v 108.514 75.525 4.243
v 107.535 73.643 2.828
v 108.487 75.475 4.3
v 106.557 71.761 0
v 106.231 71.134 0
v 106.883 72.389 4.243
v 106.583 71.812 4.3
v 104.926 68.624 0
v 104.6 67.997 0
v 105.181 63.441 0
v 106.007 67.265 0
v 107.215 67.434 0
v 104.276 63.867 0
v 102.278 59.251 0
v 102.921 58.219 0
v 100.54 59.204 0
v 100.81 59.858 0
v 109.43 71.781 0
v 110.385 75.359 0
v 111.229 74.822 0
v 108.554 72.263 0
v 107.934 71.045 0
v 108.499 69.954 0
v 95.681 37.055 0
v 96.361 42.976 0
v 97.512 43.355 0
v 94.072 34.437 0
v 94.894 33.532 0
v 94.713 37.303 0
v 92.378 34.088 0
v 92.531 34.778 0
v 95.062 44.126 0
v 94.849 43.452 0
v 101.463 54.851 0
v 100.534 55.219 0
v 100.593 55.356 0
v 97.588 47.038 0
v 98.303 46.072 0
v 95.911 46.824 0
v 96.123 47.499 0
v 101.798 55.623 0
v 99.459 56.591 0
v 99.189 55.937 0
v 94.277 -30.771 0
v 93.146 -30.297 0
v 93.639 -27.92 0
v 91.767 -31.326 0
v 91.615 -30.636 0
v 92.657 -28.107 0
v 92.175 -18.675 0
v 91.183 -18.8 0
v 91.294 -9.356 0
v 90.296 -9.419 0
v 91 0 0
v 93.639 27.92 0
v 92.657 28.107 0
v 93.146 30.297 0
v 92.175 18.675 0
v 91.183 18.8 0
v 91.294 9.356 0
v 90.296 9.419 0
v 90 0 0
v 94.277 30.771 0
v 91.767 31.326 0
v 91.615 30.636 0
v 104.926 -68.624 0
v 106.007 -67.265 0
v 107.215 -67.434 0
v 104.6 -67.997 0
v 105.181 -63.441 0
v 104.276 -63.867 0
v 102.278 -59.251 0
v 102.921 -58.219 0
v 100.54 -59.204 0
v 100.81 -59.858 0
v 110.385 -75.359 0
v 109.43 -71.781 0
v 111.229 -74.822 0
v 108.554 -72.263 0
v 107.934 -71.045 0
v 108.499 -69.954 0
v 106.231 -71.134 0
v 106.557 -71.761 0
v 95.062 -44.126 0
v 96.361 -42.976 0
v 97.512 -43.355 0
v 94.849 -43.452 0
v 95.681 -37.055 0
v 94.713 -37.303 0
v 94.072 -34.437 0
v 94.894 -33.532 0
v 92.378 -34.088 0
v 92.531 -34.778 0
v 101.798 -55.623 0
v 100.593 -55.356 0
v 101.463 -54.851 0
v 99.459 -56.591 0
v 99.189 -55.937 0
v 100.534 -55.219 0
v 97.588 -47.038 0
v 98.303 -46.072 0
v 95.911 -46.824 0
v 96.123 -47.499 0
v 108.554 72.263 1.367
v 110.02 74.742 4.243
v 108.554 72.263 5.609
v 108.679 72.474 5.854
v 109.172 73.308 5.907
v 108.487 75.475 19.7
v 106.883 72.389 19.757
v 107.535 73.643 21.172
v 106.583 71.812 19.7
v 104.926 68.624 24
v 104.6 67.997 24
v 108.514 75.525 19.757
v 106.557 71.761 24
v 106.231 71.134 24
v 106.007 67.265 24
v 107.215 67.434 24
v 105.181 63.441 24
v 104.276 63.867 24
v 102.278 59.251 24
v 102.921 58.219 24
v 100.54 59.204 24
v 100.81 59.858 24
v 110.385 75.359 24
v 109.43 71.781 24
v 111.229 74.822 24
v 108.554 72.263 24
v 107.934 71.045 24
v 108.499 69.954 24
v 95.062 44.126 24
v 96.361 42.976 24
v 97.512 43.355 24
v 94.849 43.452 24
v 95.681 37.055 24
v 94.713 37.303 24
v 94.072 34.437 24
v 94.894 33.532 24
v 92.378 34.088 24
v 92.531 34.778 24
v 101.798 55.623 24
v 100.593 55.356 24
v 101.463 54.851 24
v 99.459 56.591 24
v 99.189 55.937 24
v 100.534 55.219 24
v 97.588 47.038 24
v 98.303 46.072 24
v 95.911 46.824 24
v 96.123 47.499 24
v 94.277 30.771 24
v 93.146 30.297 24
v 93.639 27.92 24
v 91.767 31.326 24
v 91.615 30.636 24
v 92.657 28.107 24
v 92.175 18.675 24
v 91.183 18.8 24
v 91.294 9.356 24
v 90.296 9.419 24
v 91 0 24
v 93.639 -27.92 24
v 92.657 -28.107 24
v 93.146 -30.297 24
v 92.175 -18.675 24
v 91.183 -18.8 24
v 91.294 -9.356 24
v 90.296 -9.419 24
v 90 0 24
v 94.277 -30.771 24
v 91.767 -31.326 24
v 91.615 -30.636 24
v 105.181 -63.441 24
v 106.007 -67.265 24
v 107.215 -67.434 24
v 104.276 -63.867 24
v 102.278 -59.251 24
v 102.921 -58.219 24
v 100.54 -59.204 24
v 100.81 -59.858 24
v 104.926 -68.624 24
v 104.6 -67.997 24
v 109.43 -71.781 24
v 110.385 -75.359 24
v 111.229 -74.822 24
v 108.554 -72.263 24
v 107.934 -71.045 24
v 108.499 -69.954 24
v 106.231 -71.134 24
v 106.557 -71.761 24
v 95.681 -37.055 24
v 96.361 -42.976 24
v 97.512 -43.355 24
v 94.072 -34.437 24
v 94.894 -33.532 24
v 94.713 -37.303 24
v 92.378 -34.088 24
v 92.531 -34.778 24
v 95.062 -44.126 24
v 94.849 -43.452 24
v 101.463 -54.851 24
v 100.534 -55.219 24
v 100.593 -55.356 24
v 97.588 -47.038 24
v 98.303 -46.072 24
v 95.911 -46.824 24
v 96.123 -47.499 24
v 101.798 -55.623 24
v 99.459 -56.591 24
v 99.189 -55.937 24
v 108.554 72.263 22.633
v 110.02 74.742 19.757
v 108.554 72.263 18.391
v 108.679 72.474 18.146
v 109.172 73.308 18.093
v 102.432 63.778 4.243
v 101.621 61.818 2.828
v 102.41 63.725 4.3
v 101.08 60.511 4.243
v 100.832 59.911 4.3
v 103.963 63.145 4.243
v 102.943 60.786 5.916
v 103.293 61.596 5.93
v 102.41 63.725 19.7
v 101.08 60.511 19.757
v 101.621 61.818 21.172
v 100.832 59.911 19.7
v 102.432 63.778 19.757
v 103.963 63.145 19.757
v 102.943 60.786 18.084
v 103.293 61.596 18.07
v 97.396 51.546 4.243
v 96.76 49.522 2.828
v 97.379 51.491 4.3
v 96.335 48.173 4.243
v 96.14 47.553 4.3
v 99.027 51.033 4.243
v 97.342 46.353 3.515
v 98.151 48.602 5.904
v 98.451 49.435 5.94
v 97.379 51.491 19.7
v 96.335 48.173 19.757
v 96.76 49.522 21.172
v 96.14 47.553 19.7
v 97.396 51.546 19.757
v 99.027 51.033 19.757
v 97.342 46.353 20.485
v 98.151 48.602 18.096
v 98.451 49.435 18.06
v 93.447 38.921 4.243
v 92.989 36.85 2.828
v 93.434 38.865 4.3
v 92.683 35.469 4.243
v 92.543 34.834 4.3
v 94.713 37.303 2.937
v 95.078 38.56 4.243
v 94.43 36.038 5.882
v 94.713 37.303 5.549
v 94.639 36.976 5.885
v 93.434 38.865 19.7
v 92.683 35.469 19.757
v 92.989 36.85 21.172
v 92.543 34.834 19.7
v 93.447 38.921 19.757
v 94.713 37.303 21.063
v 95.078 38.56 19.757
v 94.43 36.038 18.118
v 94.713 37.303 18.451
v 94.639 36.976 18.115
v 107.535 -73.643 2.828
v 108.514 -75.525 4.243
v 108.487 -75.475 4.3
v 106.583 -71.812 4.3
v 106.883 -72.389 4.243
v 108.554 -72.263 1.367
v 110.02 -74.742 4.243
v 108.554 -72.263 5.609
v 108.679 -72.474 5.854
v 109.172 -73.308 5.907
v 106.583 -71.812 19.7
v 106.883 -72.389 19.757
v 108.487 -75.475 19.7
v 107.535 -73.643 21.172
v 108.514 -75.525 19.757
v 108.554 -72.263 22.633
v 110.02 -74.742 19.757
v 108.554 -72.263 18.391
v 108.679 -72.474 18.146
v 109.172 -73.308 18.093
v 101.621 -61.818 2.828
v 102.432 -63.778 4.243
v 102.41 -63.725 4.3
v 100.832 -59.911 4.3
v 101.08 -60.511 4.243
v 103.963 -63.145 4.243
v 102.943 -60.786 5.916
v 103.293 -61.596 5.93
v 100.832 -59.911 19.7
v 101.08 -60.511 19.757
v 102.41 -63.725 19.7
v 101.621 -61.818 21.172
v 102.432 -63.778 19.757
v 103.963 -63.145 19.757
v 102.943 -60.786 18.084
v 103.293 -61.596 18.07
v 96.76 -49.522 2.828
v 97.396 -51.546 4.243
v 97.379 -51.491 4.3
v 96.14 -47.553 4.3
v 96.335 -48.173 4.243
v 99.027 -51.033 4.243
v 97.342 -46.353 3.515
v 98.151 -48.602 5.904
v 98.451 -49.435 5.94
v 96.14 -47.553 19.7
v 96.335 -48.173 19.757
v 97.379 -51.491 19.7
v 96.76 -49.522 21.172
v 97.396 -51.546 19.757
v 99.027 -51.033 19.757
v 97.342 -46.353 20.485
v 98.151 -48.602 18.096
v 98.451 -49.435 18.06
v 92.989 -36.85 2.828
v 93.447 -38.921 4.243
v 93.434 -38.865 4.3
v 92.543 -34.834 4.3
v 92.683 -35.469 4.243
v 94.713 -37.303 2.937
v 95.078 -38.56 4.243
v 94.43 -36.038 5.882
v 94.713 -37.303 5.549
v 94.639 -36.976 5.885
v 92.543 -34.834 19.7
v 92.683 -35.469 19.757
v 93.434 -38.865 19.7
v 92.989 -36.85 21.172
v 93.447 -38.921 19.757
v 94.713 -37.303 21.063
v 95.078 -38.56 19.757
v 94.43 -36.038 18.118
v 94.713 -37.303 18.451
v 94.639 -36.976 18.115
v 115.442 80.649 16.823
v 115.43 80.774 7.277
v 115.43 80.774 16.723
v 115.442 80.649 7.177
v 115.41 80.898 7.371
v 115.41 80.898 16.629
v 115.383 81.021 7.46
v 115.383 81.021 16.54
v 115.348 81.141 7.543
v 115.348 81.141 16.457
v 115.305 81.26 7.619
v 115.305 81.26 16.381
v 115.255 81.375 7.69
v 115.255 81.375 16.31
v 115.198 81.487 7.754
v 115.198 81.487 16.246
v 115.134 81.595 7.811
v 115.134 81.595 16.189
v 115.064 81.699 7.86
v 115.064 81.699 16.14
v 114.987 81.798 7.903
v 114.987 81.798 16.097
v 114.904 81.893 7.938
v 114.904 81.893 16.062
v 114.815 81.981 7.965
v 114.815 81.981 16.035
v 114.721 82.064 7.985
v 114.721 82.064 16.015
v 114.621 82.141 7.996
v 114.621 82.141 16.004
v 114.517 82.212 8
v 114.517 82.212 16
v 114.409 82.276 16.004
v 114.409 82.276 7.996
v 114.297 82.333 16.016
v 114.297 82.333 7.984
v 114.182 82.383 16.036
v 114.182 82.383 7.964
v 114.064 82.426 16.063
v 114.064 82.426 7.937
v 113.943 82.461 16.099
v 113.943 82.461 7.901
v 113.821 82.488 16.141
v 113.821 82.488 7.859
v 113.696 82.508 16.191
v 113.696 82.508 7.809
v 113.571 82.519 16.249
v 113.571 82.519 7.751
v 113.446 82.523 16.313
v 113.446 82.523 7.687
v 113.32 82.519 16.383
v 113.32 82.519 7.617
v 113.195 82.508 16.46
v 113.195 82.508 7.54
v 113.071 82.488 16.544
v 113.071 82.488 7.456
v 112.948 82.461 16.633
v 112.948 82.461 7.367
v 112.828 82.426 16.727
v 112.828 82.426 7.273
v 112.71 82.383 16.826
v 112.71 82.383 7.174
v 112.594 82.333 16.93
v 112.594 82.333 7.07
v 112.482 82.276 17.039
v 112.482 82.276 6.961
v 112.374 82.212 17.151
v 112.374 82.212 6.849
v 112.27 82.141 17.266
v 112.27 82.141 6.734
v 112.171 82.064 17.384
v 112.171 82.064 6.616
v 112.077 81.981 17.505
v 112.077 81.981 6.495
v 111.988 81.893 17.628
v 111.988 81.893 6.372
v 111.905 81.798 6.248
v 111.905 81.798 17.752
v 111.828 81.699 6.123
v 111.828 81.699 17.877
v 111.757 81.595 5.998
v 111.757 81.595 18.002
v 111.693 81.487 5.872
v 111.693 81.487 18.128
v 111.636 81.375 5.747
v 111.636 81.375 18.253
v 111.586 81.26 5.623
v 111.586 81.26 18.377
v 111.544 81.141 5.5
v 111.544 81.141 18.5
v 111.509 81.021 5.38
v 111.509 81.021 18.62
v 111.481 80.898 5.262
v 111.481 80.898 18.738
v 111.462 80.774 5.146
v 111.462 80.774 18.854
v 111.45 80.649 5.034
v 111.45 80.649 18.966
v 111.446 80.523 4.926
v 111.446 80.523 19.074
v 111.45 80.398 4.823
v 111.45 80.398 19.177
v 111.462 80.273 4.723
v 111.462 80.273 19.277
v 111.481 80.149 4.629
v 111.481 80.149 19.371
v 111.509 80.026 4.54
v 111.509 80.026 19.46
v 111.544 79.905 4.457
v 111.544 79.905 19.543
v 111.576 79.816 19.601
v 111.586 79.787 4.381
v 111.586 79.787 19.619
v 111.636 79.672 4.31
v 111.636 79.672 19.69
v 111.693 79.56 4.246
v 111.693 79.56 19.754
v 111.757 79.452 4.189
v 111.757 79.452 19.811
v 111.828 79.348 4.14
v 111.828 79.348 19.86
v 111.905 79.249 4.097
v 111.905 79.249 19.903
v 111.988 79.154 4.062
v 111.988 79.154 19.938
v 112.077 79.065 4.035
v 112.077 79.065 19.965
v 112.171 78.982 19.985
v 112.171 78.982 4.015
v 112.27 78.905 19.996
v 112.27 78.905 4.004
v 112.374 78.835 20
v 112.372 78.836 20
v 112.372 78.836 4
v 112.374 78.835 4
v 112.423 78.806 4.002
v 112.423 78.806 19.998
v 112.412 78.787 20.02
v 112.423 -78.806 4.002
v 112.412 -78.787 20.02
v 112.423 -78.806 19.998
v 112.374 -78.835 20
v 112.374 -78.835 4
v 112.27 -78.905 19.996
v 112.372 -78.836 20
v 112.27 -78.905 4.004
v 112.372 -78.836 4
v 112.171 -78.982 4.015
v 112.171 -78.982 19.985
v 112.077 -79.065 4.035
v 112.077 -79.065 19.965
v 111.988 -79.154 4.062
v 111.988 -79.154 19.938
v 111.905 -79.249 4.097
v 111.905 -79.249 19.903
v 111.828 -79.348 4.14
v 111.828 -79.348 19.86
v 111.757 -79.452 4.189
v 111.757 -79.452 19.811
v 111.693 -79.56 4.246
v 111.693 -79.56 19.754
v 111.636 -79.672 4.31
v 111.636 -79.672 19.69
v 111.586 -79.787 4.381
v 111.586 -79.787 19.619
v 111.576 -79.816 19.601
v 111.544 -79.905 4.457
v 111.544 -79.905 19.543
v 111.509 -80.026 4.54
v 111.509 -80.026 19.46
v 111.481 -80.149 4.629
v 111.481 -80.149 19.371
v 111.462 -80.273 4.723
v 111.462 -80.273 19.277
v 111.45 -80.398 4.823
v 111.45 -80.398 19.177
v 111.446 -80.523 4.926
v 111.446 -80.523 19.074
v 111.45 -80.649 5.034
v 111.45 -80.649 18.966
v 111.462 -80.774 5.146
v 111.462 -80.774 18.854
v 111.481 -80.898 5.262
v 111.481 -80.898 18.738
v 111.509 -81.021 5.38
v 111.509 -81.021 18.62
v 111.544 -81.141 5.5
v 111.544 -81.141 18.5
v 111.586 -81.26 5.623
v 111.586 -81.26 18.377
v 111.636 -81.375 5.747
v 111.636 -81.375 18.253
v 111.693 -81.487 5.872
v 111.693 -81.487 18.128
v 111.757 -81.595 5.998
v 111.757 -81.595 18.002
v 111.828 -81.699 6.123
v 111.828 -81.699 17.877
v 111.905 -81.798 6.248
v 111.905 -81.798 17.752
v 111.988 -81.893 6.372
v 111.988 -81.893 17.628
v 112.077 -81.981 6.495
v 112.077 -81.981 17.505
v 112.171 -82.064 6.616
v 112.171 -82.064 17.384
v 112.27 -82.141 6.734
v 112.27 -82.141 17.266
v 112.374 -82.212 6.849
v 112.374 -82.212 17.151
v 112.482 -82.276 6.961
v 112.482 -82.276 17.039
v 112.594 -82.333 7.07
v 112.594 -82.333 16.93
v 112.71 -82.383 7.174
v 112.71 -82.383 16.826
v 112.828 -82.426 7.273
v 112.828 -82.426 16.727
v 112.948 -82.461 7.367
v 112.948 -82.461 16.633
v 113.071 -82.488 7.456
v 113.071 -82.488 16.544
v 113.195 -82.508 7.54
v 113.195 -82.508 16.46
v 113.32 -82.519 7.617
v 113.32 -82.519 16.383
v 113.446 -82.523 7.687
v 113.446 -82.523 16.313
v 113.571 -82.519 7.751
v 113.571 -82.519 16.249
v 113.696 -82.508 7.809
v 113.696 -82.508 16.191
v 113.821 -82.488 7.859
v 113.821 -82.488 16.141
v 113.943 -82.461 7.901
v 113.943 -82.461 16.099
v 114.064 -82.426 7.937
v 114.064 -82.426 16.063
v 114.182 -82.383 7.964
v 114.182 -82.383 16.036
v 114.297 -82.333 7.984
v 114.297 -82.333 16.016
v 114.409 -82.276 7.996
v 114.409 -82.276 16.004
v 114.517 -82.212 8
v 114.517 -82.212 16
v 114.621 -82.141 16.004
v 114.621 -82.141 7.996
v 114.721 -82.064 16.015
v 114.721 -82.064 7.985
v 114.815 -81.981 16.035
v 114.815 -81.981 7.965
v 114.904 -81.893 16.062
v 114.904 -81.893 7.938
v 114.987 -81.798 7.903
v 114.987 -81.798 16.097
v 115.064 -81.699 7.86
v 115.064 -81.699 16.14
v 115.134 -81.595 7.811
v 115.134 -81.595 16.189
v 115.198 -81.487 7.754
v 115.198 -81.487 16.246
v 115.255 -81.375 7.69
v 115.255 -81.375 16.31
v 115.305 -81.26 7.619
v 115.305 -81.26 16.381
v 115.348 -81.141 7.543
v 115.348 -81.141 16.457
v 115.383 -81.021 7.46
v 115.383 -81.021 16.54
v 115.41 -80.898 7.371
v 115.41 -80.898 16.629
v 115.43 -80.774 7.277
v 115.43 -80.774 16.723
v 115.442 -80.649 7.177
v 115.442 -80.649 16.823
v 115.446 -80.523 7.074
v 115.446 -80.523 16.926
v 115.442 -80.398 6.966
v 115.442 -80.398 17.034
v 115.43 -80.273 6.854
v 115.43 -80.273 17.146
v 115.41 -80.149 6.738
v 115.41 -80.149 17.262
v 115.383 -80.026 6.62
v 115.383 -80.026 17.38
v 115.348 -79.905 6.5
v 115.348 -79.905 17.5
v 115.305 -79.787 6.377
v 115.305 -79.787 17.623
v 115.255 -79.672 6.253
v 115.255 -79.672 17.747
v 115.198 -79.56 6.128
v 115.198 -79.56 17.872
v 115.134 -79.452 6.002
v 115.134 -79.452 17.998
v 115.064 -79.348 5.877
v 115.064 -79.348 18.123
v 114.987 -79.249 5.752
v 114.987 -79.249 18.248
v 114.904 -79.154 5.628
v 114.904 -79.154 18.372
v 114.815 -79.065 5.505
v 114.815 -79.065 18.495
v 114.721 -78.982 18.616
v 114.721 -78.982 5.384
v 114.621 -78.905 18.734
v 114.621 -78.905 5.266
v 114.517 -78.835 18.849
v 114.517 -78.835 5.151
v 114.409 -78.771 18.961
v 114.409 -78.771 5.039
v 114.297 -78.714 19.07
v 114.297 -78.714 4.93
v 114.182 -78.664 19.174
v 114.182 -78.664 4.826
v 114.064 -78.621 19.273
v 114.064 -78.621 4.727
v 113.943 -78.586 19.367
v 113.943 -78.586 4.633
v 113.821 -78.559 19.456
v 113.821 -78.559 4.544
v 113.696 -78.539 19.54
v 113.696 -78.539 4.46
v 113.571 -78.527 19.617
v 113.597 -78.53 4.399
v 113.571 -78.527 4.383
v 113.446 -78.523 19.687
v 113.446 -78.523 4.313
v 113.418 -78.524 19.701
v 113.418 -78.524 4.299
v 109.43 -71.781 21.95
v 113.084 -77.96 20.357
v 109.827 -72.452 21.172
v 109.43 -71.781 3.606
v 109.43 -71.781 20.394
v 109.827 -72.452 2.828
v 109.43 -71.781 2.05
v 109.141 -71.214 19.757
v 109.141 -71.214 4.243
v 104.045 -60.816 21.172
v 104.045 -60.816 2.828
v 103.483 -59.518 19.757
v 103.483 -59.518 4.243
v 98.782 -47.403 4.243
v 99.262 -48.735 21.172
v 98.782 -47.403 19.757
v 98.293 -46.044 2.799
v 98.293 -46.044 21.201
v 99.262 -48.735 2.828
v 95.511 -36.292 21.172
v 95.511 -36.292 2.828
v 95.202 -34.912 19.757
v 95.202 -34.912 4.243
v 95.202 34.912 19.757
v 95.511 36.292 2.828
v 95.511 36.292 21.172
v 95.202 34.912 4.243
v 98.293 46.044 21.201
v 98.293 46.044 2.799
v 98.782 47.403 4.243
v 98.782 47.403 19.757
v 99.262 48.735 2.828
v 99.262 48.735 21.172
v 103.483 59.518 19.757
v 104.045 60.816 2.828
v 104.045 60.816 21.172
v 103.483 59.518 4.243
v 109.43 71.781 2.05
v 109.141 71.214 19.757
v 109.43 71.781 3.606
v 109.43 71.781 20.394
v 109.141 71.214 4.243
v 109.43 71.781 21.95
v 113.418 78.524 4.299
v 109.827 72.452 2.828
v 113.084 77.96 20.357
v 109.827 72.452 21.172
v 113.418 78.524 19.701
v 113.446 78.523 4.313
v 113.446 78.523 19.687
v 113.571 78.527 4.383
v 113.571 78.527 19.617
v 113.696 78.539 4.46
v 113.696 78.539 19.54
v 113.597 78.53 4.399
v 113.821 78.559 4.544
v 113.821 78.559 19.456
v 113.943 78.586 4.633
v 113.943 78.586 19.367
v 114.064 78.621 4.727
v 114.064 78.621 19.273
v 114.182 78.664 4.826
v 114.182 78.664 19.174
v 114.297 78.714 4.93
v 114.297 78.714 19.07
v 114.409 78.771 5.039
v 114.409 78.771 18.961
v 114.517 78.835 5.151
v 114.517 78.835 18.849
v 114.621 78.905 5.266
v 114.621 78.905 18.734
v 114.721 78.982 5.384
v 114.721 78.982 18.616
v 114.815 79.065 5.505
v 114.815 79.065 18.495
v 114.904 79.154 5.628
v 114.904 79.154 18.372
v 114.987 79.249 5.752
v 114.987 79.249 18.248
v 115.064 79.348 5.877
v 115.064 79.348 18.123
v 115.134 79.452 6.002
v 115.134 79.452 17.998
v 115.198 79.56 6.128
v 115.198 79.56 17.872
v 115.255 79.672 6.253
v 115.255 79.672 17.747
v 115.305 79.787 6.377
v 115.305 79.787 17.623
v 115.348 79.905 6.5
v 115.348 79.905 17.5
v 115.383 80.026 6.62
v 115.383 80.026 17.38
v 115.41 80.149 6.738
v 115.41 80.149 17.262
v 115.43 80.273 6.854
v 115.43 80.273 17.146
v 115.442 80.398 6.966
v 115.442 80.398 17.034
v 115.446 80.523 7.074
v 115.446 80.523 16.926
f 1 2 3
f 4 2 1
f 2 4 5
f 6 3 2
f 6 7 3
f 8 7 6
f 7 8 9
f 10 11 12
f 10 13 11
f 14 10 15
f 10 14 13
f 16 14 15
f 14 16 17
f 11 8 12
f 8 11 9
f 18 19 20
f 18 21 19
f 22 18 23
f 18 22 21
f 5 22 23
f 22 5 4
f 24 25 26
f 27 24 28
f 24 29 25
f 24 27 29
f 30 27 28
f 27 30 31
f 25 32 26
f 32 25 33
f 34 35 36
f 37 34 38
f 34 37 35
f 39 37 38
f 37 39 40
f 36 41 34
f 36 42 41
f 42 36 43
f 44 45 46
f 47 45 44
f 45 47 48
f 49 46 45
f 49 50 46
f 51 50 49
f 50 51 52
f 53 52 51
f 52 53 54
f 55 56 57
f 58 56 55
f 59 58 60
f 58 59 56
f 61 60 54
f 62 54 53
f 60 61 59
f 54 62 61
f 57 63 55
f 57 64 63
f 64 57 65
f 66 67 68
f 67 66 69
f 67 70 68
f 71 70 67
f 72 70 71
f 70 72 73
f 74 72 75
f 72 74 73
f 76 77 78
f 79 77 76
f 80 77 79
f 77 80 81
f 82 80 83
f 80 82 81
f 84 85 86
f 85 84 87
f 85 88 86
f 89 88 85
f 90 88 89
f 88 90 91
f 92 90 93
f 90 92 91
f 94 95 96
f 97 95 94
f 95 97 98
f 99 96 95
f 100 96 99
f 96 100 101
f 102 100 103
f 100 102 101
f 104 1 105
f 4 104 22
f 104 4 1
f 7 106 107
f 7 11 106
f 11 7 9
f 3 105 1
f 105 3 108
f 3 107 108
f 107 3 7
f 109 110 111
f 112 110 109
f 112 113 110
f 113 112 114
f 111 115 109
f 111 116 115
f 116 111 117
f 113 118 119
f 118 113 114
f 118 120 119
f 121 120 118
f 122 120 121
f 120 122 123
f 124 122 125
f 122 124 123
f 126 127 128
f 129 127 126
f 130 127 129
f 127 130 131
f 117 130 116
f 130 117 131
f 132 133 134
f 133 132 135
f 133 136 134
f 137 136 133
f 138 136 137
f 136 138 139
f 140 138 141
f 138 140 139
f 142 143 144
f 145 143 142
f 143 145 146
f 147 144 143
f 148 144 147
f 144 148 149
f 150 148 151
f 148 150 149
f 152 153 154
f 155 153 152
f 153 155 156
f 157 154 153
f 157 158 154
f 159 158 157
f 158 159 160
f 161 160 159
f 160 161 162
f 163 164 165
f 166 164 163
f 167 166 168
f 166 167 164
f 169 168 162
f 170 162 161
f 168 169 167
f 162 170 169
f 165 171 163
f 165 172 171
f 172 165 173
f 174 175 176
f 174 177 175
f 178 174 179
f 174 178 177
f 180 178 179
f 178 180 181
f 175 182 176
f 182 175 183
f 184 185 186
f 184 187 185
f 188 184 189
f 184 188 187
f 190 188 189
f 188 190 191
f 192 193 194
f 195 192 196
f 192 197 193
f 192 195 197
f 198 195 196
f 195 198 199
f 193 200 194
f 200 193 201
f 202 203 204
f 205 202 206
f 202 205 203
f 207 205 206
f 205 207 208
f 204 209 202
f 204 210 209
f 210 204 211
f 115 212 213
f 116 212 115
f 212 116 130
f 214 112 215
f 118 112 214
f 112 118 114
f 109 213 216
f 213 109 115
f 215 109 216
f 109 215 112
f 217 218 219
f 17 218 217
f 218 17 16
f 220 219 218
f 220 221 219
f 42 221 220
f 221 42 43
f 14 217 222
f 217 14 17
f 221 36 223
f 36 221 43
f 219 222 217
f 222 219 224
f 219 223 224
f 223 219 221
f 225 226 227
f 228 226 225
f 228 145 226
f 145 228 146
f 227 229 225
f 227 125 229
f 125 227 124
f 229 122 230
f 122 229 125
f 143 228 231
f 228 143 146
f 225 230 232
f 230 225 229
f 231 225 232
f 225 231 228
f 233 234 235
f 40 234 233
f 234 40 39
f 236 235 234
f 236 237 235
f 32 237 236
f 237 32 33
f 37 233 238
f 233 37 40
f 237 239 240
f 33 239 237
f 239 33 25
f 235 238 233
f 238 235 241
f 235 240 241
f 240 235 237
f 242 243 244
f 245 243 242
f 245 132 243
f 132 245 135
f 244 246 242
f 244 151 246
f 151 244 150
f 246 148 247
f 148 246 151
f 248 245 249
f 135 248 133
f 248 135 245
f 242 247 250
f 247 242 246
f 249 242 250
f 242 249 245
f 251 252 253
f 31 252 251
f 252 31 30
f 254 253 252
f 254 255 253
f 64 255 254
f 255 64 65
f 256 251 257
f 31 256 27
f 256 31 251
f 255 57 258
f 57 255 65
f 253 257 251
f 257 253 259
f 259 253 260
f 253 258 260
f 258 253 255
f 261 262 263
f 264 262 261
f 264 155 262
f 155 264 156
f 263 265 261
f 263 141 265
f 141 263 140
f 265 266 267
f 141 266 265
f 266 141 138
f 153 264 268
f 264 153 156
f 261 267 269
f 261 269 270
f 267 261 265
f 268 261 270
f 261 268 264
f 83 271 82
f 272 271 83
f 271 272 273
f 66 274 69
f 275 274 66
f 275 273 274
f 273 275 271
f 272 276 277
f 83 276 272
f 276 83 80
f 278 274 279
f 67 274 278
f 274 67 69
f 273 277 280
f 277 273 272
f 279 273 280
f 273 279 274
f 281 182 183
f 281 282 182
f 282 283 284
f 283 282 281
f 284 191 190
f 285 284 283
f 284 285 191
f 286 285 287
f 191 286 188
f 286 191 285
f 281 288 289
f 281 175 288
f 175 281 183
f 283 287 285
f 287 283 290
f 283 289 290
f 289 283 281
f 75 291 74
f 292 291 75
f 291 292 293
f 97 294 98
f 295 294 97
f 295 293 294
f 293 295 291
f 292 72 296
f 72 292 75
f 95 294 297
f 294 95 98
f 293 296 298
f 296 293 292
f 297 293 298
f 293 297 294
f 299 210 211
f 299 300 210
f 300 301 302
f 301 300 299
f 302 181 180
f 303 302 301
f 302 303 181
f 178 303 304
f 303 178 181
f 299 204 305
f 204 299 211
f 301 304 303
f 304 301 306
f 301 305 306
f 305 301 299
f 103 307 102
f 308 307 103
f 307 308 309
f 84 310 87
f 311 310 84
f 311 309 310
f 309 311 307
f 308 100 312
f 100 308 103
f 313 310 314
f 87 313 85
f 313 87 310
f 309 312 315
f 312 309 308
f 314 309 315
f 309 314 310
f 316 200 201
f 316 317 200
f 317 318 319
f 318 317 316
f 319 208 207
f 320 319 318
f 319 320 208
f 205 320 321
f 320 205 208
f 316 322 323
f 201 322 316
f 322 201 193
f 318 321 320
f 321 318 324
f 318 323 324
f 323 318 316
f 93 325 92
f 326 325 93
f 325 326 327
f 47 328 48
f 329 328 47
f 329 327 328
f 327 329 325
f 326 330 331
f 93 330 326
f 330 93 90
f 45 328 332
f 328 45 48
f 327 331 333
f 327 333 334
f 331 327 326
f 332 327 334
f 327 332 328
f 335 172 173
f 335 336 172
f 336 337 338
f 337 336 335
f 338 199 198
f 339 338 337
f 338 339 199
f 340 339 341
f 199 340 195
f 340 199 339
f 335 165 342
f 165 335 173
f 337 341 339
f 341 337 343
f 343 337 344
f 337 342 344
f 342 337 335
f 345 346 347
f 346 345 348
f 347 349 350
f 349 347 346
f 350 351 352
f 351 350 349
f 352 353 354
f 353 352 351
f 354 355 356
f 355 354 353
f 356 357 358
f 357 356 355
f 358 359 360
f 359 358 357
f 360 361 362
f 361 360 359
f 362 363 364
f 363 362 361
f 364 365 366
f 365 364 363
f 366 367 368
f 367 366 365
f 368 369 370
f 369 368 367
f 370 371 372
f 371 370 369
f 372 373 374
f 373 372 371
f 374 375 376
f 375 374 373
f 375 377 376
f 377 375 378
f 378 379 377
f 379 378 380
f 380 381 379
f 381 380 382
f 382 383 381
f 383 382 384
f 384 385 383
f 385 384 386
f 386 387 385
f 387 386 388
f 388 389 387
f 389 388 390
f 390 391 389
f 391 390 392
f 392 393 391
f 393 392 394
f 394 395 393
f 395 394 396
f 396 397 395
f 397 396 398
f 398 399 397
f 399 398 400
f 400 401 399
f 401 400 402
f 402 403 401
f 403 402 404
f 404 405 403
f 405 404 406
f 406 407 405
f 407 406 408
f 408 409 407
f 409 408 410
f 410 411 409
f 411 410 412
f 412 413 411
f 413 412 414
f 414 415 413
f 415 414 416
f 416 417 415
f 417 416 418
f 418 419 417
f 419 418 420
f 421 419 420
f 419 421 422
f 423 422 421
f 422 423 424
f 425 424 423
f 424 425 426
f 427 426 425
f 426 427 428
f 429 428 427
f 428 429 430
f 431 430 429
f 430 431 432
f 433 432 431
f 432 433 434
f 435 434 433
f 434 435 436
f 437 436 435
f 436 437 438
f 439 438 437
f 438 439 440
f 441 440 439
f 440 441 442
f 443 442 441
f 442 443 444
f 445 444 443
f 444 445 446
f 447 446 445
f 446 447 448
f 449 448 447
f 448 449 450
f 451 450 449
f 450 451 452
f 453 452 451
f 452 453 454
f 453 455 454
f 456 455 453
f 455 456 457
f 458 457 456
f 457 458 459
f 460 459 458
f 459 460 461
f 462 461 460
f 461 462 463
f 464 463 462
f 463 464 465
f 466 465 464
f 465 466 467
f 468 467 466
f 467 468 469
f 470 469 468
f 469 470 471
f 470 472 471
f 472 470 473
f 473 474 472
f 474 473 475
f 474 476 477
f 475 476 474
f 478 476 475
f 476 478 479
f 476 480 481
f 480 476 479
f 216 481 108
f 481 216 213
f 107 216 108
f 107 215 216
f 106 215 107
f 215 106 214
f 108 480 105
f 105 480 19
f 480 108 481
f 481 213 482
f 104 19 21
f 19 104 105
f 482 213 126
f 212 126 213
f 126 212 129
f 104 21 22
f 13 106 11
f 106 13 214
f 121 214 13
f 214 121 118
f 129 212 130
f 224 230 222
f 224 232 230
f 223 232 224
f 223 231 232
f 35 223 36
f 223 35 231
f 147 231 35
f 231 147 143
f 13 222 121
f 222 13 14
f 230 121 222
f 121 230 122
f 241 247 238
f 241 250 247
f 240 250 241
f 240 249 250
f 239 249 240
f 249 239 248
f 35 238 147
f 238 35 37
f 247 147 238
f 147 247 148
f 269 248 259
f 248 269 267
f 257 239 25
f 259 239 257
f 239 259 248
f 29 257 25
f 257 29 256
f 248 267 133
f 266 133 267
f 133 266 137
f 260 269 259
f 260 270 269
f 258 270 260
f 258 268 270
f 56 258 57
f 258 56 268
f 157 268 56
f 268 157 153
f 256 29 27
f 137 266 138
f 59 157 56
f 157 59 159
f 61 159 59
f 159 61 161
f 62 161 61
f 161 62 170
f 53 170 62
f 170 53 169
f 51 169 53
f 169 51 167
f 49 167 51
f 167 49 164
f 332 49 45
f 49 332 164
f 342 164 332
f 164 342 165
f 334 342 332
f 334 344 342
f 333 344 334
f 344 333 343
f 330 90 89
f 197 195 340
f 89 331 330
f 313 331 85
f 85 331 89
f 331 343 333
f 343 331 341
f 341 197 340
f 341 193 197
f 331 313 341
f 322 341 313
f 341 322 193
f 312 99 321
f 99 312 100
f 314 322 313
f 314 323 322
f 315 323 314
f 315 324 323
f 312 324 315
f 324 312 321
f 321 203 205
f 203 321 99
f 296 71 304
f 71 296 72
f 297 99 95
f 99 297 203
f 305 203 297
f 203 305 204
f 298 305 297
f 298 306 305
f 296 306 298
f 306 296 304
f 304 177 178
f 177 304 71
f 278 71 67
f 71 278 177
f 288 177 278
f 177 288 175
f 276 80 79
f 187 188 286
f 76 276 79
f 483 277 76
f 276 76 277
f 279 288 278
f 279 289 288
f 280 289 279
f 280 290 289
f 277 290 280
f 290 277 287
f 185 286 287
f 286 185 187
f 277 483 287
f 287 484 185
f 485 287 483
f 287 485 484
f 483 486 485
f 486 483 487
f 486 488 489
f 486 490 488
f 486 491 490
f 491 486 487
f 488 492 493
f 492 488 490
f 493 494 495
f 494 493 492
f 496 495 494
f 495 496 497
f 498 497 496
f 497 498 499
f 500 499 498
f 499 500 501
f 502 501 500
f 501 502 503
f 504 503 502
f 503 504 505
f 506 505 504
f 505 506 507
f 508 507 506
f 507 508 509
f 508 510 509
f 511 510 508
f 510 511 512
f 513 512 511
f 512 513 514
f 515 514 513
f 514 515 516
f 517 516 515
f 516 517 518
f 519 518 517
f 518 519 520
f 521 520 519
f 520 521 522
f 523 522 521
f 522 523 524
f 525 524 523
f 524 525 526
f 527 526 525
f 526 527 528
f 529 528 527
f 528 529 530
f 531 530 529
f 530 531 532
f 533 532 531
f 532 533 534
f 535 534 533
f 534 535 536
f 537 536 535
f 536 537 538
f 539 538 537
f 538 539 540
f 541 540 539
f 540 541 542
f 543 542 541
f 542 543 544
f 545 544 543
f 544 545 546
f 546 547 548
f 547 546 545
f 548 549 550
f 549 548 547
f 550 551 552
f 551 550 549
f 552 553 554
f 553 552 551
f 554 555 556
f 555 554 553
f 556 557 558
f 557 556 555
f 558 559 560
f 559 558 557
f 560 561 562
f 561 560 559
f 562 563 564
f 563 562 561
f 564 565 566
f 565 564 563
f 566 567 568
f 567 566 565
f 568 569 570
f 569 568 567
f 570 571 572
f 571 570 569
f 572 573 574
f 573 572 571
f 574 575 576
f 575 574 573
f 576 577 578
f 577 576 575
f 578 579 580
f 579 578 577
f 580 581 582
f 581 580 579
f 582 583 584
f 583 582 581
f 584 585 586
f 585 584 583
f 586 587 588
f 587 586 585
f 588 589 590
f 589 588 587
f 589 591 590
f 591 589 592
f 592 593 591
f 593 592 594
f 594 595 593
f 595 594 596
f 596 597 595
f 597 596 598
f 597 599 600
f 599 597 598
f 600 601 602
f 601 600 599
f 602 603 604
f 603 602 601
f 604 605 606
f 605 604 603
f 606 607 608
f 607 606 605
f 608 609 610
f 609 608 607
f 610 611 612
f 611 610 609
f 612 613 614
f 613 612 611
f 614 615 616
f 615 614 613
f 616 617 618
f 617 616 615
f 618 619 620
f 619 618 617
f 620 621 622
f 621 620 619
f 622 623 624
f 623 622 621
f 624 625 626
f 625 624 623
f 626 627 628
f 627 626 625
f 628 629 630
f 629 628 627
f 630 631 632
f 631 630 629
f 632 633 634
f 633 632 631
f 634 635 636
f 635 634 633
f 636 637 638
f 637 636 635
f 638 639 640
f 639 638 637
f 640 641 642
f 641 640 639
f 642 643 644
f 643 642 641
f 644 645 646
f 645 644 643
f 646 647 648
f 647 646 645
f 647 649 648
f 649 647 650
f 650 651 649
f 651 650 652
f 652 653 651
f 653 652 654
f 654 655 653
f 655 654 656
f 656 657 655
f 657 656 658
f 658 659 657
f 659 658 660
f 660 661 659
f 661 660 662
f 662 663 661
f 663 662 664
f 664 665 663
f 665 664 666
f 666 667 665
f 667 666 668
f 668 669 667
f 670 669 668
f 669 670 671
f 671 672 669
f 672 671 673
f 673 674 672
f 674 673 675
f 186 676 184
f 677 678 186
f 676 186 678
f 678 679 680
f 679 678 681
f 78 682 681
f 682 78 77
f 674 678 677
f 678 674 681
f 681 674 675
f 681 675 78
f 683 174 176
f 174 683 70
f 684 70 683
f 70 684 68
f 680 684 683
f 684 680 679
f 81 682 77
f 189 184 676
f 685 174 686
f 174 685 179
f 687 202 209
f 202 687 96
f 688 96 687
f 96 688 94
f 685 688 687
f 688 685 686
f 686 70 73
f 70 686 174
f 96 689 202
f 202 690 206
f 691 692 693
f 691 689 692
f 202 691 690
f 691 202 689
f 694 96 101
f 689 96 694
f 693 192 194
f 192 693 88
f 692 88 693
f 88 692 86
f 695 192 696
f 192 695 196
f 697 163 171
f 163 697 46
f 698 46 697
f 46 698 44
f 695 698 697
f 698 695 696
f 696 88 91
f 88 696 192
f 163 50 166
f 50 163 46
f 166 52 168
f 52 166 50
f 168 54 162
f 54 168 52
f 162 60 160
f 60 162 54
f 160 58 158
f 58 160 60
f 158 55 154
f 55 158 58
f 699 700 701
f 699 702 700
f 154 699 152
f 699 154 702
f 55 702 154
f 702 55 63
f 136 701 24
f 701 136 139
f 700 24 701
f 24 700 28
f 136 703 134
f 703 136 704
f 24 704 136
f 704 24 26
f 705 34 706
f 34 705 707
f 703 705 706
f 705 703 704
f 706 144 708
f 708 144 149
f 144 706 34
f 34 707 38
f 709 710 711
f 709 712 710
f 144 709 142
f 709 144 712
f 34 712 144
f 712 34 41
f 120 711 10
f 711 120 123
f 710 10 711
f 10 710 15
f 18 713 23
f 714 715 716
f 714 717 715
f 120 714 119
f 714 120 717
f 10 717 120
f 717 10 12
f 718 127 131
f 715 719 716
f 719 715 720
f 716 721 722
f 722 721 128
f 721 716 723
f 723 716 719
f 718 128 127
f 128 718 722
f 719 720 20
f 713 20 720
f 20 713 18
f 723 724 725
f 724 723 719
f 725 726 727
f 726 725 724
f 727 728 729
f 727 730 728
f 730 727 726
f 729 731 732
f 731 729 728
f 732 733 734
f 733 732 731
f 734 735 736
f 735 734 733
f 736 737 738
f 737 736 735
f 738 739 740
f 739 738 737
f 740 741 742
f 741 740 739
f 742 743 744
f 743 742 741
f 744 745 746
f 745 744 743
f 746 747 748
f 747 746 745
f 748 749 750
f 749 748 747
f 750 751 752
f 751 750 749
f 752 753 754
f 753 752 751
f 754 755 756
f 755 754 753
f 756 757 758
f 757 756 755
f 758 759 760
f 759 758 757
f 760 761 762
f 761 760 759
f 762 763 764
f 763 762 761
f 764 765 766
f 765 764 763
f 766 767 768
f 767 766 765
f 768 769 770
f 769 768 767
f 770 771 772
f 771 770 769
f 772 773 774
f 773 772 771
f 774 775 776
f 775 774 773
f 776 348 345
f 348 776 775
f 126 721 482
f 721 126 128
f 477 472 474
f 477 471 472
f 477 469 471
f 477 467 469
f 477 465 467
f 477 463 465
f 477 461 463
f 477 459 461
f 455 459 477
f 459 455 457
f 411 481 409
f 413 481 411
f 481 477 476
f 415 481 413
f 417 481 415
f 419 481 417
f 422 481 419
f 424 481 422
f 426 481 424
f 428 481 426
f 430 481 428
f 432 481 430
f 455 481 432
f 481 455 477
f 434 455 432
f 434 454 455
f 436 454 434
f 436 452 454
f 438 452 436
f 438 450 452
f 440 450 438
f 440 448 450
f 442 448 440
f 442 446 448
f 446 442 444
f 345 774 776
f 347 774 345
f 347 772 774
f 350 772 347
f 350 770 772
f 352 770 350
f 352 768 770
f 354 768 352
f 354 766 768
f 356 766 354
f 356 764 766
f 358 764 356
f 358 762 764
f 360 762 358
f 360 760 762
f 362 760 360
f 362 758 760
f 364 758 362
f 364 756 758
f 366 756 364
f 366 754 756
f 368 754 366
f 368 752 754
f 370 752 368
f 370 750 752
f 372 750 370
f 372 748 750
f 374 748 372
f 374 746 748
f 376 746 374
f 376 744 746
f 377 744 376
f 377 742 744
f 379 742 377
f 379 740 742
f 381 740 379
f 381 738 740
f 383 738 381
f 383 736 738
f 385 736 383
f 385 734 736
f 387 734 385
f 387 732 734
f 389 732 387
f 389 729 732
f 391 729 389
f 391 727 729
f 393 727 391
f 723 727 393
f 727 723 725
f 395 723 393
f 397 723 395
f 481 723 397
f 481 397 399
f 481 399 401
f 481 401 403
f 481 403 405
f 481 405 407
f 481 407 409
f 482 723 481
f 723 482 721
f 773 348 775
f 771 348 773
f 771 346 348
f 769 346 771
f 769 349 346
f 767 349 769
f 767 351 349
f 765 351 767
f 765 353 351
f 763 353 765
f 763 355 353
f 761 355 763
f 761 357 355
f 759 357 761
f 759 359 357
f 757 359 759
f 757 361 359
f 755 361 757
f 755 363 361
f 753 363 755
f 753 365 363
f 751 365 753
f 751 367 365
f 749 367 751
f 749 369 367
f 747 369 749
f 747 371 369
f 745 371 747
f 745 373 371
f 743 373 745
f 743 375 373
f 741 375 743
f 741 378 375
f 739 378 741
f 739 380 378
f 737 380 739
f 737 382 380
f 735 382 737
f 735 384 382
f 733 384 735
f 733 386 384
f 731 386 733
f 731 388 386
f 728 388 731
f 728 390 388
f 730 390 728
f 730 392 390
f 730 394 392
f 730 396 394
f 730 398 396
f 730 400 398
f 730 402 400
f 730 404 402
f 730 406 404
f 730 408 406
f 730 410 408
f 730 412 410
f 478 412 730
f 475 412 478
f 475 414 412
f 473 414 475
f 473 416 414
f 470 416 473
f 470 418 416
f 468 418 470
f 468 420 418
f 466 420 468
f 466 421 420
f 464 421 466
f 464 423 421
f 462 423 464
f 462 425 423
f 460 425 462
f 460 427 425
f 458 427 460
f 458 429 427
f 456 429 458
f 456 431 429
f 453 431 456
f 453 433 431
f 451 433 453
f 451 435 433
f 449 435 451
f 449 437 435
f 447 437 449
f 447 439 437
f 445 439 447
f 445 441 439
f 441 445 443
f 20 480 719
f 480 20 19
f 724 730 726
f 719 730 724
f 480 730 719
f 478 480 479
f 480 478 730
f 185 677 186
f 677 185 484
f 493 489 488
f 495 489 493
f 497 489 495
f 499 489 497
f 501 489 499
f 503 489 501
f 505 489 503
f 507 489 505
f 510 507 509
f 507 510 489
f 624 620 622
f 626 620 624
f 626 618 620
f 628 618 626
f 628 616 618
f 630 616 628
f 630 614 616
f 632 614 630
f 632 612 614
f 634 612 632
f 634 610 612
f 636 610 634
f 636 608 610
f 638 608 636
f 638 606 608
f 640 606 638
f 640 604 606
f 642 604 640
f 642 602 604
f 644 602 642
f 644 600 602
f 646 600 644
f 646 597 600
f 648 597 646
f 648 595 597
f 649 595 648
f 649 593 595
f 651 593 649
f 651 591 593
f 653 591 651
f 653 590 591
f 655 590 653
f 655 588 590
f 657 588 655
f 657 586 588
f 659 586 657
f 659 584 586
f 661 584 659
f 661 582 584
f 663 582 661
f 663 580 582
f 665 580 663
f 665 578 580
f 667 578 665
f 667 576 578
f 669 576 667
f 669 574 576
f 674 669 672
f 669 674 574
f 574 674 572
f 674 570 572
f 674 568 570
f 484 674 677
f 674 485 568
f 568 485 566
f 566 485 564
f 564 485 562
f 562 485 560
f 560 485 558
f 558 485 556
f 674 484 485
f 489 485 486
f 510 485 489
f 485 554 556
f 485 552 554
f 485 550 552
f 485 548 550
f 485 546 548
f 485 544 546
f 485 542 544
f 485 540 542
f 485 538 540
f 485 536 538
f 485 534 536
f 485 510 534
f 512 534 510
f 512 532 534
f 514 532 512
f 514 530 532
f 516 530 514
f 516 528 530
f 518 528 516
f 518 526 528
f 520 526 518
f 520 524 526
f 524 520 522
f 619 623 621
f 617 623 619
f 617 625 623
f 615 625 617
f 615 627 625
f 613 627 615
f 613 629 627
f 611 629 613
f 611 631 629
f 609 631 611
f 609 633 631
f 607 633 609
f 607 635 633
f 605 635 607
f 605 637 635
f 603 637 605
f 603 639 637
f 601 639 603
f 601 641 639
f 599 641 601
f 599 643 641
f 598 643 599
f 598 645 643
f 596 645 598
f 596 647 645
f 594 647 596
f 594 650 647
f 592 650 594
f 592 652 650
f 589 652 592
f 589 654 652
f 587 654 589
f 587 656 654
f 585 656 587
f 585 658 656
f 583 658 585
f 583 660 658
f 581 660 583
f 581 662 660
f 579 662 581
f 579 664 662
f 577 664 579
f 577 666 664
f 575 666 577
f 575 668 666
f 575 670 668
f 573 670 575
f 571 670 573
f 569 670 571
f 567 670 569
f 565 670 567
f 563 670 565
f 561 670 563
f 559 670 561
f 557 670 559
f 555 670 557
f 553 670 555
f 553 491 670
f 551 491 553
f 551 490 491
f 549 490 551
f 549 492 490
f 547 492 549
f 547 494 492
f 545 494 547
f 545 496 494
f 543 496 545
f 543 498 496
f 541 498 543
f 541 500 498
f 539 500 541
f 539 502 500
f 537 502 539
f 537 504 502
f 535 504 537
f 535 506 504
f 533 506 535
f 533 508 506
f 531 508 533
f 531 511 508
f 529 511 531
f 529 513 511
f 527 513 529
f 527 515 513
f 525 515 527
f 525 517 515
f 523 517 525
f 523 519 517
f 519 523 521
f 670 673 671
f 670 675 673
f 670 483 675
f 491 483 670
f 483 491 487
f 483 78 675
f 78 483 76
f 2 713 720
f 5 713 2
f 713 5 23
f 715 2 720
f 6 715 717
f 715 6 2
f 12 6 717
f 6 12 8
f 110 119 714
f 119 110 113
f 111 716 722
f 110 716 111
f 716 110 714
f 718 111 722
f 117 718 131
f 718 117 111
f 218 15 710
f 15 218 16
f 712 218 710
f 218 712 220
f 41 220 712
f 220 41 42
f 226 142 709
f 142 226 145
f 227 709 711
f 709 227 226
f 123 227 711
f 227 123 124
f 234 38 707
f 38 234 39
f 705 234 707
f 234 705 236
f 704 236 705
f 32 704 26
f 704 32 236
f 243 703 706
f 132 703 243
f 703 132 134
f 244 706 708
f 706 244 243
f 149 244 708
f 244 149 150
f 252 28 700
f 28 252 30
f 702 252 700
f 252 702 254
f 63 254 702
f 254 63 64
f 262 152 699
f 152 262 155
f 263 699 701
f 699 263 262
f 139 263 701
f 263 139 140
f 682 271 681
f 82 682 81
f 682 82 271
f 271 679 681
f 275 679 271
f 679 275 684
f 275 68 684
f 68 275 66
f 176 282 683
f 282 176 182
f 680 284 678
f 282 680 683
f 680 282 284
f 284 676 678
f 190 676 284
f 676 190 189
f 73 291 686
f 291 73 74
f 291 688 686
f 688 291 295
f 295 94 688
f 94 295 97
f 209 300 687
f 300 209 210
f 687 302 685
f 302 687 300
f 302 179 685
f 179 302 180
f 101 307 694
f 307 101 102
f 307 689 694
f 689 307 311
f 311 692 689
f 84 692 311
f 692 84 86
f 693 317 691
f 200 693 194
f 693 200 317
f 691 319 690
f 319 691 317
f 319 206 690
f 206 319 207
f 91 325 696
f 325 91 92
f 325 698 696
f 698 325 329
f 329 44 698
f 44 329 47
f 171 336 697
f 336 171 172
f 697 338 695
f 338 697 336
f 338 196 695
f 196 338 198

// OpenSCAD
$fn=100;

arch_distance = 170; //width of the mask buckle
radius_of_arch = 150;
band_thickness=1.0;
buckle_height= 24.0;
end_knub_size=2;
hook_width = 2;
hook_depth = 2;
hook_count = 4;

bed_size=[250,200];

number_to_print=1; //42 max


for(num=[1:number_to_print]){
  translate([radius_of_arch+bed_size[0]/2-30,0]){
    rotate(90){
      translate([0,(band_thickness+hook_depth+2)*num]){
        stacked_headbands(arch_distance,
                        radius_of_arch,
                        band_thickness,
                        buckle_height,
                        end_knub_size,
                        hook_width,
                        hook_depth,
                        hook_count);
      }
    }
  }
  
  color("#000000"){
    square(bed_size, center=true);
  }
}

module stacked_headbands(arch_distance,
                  radius_of_arch,
                  band_thickness,
                  buckle_height,
                  end_knub_size,
                  hook_width,
                  hook_depth,
                  hook_count){
            
  angle = 360*(arch_distance/(2*PI*radius_of_arch));
                    

  difference(){
    union(){
      linear_extrude(buckle_height){   
        union(){    
          difference(){
            union(){
              circle(radius_of_arch);
            }
           
            circle(radius_of_arch-band_thickness);
            rotate(90+angle/2){
              square(arch_distance);
            }
            
            rotate(-angle/2){
              square(arch_distance);
            }
            
            translate([0,-arch_distance]){
              square(2*arch_distance,center=true);
            }  
          }
          //Create knubs on end
          mirror_copy(){
            translate(
                 X_Y_from_radius_angle(
                     radius_of_arch, 
                     (90-angle/2))){
              circle(end_knub_size);
            }
          }
        }
      }
      
      //Create the knubs
      mirror_copy(){
        for(x=[1:hook_count]){
          rotate(-angle/2 + x*5){
            translate([0,
               radius_of_arch-band_thickness/2]){
              create_extension(buckle_height, 
                  hook_width, hook_depth);  
            }
          }
        }
      }
    }
    //end angle difference
    mirror_copy(){
      rotate(-angle/2){
        translate([0,radius_of_arch]){
          end_angle(buckle_height);
        }
      }
    } 
    
    //Create the knubs negative part
    mirror_copy(){
      for(x=[1:hook_count]){
        rotate(-angle/2 + x*5){
          translate([0,
             radius_of_arch-band_thickness/2-1,
             ]){
               create_extension_removal(
                   buckle_height, 
                   hook_width, hook_depth);  
          }
        }
      }
    } 
  }
}

//Calculate [X,Y] given radius and angle
function X_Y_from_radius_angle(radius, angle) =
   [radius*cos(angle),radius*sin(angle)];


module end_angle(buckle_height){
  left_adjust = -buckle_height/4;

  translate([0,buckle_height/2]){
    rotate([90,0,0]){
      linear_extrude(buckle_height){
        translate([left_adjust,0]){  
          polygon([
                  [0,0],
                  [buckle_height/3, 
                     buckle_height/3],
                  [buckle_height/3, 
                     2*buckle_height/3],  
                  [0,buckle_height],
                  [buckle_height/2,buckle_height],
                  [buckle_height/2, 0],
                  ]);
        }
      }  
    }
  }
}

module hook(buckle_height, hook_width,hook_depth){
  left_adjust=(hook_width/sin(45))/2;

  translate([0,hook_depth]){
    rotate([90,0,0]){
      linear_extrude(hook_depth){
        translate([-left_adjust,0,0]){
          polygon([
                  [0,0], 
                  [buckle_height/4*sin(45),
                         buckle_height/4*sin(45)],
                  [buckle_height/4*sin(45) 
                         + hook_width*sin(45),
                         buckle_height/4*sin(45)
                         - hook_width*sin(45)],
                  [hook_width/cos(45), 0],
                  ]);  
        } 
      }
    } 
  }
}

module create_extension(buckle_height, hook_width, hook_depth){
  
  mirror_copy_headband(){
    difference(){
      hook(1.5*buckle_height,
           1.5*hook_width,hook_depth);
      translate([-1.5*hook_width,
           2.1*1.5*hook_width]){
        rotate([45,0,0]){
          cube(buckle_height/2,buckle_height/2);
        }
      }
    }
  }
}

module create_extension_removal(buckle_height, hook_width, hook_depth){
  
  mirror_copy_headband(){
    hook(buckle_height,
           hook_width,6*hook_depth);
  }
}

//See https://en.wikibooks.org/wiki/OpenSCAD_User_Manual/Tips_and_Tricks#Create_a_mirrored_object_while_retaining_the_original
module mirror_copy(v = [1, 0, 0]) {
    children();
    mirror(v) children();
}

module mirror_copy_headband(v = [0, 0, 1]) {
    children();
    translate([0,0,buckle_height]){
      mirror(v) children();
    }
}
